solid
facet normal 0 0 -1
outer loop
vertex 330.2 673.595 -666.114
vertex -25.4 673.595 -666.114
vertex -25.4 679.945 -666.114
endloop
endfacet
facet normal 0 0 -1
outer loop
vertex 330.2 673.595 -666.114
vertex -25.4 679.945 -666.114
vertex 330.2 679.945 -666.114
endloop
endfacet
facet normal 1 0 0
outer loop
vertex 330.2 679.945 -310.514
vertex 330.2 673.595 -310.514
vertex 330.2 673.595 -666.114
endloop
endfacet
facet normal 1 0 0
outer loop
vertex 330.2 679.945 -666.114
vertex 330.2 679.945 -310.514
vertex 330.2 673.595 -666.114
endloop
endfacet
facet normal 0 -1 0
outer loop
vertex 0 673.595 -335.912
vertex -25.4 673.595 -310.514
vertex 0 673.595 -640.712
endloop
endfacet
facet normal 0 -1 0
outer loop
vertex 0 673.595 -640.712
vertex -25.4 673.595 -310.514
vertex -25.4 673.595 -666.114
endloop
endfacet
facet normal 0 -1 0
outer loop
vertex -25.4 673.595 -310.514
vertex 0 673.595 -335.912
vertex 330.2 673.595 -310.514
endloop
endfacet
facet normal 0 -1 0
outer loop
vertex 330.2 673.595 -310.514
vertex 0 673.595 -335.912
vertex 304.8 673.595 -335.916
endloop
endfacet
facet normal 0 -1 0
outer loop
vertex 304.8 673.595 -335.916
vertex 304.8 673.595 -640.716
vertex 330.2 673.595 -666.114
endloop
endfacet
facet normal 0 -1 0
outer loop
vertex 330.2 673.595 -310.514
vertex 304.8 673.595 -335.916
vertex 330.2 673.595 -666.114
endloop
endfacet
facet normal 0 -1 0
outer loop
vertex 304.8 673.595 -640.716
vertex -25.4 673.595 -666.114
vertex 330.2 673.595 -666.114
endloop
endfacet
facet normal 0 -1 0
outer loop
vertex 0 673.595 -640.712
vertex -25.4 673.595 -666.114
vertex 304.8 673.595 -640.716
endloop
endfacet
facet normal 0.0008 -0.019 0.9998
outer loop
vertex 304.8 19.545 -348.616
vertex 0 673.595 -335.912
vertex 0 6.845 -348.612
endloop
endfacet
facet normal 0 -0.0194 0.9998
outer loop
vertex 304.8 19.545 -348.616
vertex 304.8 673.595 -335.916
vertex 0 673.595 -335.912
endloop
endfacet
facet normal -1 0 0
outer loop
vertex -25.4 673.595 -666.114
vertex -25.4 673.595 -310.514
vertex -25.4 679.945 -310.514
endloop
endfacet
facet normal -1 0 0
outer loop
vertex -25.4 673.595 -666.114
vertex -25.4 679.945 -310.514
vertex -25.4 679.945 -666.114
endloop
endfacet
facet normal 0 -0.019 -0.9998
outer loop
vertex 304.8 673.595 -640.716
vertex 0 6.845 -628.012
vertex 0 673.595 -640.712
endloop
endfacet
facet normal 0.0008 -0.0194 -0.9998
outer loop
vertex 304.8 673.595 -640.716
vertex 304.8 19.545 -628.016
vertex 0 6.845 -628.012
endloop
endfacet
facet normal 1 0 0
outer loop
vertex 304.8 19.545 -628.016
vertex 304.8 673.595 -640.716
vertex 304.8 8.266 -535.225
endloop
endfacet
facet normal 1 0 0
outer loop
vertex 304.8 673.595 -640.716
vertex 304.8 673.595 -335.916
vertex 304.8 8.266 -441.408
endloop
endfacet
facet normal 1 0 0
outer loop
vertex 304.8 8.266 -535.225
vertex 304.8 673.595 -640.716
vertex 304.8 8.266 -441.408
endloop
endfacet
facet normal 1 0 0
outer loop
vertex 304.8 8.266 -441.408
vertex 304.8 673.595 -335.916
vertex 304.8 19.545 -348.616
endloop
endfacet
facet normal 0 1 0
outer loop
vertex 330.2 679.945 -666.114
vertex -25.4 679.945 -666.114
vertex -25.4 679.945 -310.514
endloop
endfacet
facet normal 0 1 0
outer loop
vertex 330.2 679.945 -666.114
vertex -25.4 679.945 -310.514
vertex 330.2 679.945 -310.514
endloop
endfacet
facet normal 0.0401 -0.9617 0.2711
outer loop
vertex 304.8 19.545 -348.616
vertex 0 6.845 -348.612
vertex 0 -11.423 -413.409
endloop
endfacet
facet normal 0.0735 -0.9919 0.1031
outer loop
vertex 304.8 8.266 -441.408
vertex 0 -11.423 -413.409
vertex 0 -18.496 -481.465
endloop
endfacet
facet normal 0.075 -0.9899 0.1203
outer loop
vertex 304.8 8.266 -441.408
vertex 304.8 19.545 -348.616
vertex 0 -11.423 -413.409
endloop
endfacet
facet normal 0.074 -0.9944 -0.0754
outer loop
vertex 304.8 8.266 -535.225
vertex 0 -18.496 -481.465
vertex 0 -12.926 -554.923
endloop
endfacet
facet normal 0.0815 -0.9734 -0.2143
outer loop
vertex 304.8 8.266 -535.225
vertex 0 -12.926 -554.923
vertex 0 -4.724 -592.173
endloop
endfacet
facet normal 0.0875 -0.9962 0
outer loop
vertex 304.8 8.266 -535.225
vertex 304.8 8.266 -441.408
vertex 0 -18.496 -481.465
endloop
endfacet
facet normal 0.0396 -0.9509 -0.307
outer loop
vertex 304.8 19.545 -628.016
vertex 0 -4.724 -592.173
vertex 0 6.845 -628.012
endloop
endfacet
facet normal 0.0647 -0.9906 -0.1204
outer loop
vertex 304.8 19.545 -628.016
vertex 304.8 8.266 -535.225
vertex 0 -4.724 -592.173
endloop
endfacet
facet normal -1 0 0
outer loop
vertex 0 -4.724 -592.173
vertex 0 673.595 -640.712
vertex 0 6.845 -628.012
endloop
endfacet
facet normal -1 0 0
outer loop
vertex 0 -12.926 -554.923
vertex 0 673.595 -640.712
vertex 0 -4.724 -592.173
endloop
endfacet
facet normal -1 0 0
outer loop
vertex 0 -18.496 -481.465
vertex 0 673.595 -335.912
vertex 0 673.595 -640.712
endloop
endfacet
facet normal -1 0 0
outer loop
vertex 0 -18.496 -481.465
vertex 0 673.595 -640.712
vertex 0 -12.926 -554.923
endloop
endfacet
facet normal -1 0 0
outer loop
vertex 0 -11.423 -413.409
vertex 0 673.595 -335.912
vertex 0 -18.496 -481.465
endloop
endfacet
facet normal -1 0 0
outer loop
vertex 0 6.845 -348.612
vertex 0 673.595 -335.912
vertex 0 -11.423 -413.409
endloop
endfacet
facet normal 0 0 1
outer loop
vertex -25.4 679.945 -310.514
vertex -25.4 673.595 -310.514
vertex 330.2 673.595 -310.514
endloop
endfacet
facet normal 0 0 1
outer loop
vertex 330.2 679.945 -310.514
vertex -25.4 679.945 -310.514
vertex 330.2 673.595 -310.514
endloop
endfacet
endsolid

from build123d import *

# Parameters (mm, degrees)
SKETCH9_W = 355.6
SKETCH9_H = 355.6
LID_DEPTH = 6.35


with BuildPart() as part:
    # Tall side for Body → Body section 0
    with BuildSketch(Plane(origin=(0, 0, 0), x_dir=(0, 0, -1), z_dir=(1, 0, 0))):
        with BuildLine():
            Line((640.712288406, 673.594571301), (335.912288406, 673.594571301))
            Line((335.912288406, 673.594571301), (348.612288406, 6.844571301))
            # circular arc as an exact rational Bezier (weights 1, cos(half-angle), 1)
            Bezier((348.612288406, 6.844571301), (488.312288406, -45.692180835), (628.012288406, 6.844571301), weights=[1, 0.936, 1])
            Line((628.012288406, 6.844571301), (640.712288406, 673.594571301))
        make_face()
    # Short side for Body → Body section 1
    with BuildSketch(Plane(origin=(304.8, 0, 0), x_dir=(0, 0, -1), z_dir=(1, 0, 0))):
        with BuildLine():
            Line((640.716339838, 673.594571301), (335.916339838, 673.594571301))
            Line((335.916339838, 673.594571301), (348.616339838, 19.544571301))
            Bezier((348.616339838, 19.544571301), (488.316339838, -6.067095365), (628.016339838, 19.544571301), weights=[1, 0.983606557, 1])
            Line((628.016339838, 19.544571301), (640.716339838, 673.594571301))
        make_face()
    loft()

    # Sketch9 → Lid (add)
    with BuildSketch(Plane(origin=(0, 673.594571301, 0), x_dir=(1, 0, 0), z_dir=(0, 1, 0))):
        with Locations((152.4, 488.314314122)):
            Rectangle(SKETCH9_W, SKETCH9_H)
    extrude(amount=LID_DEPTH)


solid = part.part
